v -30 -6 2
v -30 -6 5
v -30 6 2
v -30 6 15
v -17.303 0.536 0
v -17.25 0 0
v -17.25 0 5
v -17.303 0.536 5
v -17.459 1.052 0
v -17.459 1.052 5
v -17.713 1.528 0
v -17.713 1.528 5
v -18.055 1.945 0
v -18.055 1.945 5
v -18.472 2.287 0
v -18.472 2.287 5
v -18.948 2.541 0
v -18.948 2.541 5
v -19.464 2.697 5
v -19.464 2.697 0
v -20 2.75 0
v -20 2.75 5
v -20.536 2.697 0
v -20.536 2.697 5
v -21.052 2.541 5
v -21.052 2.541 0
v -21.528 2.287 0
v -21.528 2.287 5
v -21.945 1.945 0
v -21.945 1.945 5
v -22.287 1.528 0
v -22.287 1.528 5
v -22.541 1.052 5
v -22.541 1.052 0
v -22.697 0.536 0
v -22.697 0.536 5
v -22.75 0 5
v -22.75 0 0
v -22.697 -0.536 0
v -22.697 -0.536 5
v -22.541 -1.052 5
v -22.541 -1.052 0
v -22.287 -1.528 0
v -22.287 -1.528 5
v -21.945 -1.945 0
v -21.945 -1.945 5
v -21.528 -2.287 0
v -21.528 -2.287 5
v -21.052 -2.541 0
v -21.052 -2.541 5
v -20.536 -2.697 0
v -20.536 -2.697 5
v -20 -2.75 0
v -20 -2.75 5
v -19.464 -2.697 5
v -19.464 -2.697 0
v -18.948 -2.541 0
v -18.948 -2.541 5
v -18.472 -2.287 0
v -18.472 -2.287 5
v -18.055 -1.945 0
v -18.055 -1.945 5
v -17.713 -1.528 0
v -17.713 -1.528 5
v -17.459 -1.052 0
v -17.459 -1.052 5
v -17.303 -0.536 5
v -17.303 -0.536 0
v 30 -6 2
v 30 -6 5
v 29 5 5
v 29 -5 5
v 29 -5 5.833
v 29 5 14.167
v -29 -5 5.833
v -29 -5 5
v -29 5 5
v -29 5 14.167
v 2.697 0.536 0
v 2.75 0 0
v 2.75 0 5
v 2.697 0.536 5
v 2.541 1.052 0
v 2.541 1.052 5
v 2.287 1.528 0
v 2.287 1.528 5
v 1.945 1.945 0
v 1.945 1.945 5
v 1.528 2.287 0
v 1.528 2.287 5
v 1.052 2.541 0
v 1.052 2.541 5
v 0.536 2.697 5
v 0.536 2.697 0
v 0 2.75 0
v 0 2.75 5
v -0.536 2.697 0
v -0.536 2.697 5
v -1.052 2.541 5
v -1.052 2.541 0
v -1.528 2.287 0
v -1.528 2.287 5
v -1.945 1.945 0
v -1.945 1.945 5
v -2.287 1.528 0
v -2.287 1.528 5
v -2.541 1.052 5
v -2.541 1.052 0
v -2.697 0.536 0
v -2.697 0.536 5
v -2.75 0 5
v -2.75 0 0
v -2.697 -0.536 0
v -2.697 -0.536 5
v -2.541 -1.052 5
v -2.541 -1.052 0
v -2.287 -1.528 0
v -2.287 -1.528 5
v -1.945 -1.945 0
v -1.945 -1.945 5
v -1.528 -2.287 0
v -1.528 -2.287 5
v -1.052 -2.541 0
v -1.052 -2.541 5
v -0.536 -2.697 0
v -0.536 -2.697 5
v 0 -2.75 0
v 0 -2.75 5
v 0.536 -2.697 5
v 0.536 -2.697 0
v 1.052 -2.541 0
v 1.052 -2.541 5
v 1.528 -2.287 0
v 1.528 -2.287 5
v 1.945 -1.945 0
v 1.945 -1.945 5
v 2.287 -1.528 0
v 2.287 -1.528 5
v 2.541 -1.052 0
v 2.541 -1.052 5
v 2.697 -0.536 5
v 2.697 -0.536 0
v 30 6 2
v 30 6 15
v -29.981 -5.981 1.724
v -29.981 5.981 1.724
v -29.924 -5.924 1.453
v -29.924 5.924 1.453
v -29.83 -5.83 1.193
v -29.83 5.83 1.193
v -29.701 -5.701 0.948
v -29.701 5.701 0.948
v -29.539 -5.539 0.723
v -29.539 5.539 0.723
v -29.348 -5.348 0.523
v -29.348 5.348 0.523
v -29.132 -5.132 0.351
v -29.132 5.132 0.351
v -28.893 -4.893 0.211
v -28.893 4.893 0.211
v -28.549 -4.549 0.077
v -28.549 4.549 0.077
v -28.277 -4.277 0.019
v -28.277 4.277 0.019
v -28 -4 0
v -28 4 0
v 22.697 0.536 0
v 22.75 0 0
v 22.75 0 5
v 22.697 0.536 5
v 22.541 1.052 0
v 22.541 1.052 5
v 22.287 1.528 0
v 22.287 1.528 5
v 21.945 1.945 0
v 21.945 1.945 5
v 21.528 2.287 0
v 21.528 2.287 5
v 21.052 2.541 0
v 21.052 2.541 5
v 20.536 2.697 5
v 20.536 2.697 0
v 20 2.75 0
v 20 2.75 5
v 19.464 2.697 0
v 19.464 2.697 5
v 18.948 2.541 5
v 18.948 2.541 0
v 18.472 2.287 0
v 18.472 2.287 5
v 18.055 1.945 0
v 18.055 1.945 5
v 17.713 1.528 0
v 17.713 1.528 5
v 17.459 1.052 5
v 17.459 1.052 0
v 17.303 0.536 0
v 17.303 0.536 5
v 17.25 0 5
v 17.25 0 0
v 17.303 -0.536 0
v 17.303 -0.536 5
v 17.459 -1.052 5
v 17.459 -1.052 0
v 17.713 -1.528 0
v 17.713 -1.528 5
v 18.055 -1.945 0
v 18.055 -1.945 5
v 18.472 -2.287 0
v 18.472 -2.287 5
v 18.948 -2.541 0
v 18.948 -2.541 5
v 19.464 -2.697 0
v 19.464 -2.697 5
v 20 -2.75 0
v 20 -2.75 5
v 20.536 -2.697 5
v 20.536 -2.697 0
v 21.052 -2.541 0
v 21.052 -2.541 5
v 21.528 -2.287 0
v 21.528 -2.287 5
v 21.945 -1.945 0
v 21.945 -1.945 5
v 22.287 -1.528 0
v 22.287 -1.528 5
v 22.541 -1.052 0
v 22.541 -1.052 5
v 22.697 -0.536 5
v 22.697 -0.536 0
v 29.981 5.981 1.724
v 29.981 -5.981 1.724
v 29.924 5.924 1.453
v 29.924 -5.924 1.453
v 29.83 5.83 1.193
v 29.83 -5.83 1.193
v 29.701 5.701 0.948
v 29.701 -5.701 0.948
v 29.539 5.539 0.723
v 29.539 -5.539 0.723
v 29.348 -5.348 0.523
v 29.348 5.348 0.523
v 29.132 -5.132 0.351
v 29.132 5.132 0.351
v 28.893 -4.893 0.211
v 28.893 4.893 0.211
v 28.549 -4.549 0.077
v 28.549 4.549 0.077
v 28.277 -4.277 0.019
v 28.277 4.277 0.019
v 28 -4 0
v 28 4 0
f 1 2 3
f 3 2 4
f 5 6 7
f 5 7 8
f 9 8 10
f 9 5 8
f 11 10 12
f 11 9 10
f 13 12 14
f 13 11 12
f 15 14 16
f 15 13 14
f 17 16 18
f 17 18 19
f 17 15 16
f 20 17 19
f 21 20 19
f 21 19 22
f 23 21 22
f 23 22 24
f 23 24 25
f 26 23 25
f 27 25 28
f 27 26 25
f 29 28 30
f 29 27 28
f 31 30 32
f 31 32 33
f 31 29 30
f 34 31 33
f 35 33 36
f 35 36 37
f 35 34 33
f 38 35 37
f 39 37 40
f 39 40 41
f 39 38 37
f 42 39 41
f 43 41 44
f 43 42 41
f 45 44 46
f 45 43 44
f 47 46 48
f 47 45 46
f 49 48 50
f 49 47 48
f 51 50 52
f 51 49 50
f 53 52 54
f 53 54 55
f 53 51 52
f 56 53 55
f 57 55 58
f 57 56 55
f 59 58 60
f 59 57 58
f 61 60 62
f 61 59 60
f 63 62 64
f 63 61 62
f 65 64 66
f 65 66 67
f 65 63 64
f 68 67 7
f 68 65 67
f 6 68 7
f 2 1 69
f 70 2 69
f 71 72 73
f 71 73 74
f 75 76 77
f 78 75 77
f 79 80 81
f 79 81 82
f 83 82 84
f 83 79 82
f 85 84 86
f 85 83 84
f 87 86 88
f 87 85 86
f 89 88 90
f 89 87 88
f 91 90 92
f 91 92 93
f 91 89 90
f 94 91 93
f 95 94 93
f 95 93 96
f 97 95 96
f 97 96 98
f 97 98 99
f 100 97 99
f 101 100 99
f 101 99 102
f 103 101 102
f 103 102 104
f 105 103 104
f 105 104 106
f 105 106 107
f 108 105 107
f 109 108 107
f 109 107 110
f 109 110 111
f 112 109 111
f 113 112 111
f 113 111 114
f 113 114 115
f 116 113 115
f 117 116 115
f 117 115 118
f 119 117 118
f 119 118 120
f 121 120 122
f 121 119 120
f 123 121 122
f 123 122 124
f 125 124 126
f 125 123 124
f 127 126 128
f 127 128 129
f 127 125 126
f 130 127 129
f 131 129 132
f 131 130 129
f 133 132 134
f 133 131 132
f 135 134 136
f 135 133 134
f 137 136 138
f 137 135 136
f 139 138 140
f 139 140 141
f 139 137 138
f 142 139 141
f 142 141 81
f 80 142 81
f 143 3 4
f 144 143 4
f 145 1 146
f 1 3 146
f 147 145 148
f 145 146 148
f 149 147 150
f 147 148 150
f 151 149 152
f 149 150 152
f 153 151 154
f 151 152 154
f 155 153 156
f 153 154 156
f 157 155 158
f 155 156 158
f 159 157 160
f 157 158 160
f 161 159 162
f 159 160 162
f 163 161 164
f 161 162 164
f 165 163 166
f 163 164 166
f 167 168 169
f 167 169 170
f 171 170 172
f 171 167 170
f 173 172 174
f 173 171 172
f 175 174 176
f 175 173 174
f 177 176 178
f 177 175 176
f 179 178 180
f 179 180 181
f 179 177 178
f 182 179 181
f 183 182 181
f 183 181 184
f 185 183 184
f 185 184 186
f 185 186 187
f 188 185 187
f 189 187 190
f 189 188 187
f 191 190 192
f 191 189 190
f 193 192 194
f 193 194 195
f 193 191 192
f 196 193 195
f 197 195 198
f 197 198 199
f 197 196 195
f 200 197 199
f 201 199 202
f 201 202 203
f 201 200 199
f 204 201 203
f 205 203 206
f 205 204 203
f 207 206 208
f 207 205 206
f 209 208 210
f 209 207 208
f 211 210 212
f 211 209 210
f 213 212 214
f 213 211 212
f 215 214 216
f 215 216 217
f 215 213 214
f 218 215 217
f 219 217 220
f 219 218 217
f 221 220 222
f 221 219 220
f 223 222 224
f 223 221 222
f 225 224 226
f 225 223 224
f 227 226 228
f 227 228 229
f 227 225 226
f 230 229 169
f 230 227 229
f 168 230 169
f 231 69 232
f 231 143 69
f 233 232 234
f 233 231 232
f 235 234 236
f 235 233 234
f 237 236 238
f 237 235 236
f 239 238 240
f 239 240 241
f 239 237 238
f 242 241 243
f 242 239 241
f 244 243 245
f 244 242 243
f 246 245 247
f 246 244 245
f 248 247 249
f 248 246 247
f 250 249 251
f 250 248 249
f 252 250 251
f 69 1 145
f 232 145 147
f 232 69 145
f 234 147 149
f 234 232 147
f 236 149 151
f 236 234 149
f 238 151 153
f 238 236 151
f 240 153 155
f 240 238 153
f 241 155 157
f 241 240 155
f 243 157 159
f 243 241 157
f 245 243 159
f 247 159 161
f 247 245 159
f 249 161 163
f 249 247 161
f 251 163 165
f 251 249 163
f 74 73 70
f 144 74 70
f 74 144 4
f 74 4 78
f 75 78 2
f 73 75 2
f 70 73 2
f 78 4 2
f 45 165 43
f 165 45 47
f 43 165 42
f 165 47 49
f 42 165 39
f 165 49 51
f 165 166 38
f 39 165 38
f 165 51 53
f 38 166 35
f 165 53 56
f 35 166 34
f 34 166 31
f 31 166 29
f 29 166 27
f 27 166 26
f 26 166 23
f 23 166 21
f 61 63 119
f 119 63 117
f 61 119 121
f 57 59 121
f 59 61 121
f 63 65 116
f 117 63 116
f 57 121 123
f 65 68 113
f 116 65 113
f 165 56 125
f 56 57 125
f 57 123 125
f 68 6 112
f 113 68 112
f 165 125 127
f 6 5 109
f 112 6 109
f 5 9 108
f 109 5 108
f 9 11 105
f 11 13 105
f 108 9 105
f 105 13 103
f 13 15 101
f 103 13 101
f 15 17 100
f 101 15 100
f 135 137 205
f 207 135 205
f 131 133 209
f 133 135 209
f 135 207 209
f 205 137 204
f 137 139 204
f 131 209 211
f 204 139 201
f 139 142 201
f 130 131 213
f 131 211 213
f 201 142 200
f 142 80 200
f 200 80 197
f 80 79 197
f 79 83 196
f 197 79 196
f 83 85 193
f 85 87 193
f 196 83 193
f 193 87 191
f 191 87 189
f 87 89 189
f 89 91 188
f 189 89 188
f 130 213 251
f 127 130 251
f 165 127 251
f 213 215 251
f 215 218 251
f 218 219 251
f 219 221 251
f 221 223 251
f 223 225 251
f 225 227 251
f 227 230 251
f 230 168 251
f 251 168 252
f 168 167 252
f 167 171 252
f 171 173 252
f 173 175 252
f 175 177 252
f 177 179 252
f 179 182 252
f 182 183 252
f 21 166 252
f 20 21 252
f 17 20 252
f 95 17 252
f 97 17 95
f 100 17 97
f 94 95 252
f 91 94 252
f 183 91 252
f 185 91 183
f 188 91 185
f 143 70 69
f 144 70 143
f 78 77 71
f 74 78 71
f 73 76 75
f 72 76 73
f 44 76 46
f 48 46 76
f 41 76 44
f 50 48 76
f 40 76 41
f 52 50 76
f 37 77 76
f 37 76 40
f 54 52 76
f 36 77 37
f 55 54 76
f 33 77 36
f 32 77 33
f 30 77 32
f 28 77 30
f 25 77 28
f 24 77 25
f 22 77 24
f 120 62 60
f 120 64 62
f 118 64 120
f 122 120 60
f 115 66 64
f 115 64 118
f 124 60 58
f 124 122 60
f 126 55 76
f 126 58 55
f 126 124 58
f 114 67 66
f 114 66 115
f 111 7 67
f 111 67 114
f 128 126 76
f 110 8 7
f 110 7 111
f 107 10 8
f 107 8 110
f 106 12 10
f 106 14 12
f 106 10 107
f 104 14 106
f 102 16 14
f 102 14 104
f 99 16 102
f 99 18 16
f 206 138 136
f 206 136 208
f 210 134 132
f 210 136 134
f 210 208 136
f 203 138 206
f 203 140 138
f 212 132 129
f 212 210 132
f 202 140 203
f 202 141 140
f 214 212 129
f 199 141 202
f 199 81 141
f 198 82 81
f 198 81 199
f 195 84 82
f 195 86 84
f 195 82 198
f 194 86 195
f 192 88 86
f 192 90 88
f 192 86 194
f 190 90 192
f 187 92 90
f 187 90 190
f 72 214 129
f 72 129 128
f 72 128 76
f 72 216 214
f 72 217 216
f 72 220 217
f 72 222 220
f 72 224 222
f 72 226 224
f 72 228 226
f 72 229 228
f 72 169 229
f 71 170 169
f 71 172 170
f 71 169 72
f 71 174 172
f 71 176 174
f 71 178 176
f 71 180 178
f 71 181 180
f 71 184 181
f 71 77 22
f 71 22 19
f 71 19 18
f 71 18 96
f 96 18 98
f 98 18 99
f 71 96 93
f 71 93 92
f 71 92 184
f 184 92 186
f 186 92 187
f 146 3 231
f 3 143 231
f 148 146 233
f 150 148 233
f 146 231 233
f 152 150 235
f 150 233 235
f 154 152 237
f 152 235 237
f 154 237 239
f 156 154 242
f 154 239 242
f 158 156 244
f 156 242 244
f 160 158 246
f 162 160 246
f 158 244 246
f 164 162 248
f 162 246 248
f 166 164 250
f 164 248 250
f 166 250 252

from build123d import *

# Parameters (mm, degrees)
F0_W          = 60
F0_H          = 12
F0_W_2        = 58
F0_H_2        = 10
F0_R          = 2.75
F1_DEPTH      = 5
F3_DEPTH      = 30
F3_DEPTH_BACK = 30
F4_START      = 5
F4_DEPTH      = 10.001
F5_R          = 2


with BuildPart() as f1:
    # F0 (on Top) → F1 (new body)
    with BuildSketch(Plane.XY):
        Rectangle(F0_W, F0_H)
        Rectangle(F0_W_2, F0_H_2, mode=Mode.SUBTRACT)
        Rectangle(F0_W_2, F0_H_2)
        with Locations((-20, 0)):
            Circle(F0_R, mode=Mode.SUBTRACT)
        Circle(F0_R, mode=Mode.SUBTRACT)
        with Locations((20, 0)):
            Circle(F0_R, mode=Mode.SUBTRACT)
    extrude(amount=F1_DEPTH)

    # F2 (on Right) → F3 (join, two sides)
    with BuildSketch(Plane.YZ) as f3_sk:
        Polygon((6, 15), (-6, 5), (6, 5), align=None)
    extrude(amount=-F3_DEPTH)
    extrude(f3_sk.sketch, amount=F3_DEPTH_BACK)

    # F0 (on Top) → F4 (cut)
    with BuildSketch(Plane.XY.offset(F4_START)):
        Rectangle(F0_W_2, F0_H_2)
        with Locations((-20, 0)):
            Circle(F0_R, mode=Mode.SUBTRACT)
        Circle(F0_R, mode=Mode.SUBTRACT)
        with Locations((20, 0)):
            Circle(F0_R, mode=Mode.SUBTRACT)
        Circle(F0_R)
        with Locations((-20, 0)):
            Circle(F0_R)
        with Locations((20, 0)):
            Circle(F0_R)
    extrude(amount=F4_DEPTH, mode=Mode.SUBTRACT)

    # F5
    f5_edges = [f1.edges().sort_by_distance(p)[0] for p in [
        (0, 6, 0),
        (30, 0, 0),
        (0, -6, 0),
        (-30, 0, 0),
    ]]
    fillet(f5_edges, radius=F5_R)


solid = f1.part
